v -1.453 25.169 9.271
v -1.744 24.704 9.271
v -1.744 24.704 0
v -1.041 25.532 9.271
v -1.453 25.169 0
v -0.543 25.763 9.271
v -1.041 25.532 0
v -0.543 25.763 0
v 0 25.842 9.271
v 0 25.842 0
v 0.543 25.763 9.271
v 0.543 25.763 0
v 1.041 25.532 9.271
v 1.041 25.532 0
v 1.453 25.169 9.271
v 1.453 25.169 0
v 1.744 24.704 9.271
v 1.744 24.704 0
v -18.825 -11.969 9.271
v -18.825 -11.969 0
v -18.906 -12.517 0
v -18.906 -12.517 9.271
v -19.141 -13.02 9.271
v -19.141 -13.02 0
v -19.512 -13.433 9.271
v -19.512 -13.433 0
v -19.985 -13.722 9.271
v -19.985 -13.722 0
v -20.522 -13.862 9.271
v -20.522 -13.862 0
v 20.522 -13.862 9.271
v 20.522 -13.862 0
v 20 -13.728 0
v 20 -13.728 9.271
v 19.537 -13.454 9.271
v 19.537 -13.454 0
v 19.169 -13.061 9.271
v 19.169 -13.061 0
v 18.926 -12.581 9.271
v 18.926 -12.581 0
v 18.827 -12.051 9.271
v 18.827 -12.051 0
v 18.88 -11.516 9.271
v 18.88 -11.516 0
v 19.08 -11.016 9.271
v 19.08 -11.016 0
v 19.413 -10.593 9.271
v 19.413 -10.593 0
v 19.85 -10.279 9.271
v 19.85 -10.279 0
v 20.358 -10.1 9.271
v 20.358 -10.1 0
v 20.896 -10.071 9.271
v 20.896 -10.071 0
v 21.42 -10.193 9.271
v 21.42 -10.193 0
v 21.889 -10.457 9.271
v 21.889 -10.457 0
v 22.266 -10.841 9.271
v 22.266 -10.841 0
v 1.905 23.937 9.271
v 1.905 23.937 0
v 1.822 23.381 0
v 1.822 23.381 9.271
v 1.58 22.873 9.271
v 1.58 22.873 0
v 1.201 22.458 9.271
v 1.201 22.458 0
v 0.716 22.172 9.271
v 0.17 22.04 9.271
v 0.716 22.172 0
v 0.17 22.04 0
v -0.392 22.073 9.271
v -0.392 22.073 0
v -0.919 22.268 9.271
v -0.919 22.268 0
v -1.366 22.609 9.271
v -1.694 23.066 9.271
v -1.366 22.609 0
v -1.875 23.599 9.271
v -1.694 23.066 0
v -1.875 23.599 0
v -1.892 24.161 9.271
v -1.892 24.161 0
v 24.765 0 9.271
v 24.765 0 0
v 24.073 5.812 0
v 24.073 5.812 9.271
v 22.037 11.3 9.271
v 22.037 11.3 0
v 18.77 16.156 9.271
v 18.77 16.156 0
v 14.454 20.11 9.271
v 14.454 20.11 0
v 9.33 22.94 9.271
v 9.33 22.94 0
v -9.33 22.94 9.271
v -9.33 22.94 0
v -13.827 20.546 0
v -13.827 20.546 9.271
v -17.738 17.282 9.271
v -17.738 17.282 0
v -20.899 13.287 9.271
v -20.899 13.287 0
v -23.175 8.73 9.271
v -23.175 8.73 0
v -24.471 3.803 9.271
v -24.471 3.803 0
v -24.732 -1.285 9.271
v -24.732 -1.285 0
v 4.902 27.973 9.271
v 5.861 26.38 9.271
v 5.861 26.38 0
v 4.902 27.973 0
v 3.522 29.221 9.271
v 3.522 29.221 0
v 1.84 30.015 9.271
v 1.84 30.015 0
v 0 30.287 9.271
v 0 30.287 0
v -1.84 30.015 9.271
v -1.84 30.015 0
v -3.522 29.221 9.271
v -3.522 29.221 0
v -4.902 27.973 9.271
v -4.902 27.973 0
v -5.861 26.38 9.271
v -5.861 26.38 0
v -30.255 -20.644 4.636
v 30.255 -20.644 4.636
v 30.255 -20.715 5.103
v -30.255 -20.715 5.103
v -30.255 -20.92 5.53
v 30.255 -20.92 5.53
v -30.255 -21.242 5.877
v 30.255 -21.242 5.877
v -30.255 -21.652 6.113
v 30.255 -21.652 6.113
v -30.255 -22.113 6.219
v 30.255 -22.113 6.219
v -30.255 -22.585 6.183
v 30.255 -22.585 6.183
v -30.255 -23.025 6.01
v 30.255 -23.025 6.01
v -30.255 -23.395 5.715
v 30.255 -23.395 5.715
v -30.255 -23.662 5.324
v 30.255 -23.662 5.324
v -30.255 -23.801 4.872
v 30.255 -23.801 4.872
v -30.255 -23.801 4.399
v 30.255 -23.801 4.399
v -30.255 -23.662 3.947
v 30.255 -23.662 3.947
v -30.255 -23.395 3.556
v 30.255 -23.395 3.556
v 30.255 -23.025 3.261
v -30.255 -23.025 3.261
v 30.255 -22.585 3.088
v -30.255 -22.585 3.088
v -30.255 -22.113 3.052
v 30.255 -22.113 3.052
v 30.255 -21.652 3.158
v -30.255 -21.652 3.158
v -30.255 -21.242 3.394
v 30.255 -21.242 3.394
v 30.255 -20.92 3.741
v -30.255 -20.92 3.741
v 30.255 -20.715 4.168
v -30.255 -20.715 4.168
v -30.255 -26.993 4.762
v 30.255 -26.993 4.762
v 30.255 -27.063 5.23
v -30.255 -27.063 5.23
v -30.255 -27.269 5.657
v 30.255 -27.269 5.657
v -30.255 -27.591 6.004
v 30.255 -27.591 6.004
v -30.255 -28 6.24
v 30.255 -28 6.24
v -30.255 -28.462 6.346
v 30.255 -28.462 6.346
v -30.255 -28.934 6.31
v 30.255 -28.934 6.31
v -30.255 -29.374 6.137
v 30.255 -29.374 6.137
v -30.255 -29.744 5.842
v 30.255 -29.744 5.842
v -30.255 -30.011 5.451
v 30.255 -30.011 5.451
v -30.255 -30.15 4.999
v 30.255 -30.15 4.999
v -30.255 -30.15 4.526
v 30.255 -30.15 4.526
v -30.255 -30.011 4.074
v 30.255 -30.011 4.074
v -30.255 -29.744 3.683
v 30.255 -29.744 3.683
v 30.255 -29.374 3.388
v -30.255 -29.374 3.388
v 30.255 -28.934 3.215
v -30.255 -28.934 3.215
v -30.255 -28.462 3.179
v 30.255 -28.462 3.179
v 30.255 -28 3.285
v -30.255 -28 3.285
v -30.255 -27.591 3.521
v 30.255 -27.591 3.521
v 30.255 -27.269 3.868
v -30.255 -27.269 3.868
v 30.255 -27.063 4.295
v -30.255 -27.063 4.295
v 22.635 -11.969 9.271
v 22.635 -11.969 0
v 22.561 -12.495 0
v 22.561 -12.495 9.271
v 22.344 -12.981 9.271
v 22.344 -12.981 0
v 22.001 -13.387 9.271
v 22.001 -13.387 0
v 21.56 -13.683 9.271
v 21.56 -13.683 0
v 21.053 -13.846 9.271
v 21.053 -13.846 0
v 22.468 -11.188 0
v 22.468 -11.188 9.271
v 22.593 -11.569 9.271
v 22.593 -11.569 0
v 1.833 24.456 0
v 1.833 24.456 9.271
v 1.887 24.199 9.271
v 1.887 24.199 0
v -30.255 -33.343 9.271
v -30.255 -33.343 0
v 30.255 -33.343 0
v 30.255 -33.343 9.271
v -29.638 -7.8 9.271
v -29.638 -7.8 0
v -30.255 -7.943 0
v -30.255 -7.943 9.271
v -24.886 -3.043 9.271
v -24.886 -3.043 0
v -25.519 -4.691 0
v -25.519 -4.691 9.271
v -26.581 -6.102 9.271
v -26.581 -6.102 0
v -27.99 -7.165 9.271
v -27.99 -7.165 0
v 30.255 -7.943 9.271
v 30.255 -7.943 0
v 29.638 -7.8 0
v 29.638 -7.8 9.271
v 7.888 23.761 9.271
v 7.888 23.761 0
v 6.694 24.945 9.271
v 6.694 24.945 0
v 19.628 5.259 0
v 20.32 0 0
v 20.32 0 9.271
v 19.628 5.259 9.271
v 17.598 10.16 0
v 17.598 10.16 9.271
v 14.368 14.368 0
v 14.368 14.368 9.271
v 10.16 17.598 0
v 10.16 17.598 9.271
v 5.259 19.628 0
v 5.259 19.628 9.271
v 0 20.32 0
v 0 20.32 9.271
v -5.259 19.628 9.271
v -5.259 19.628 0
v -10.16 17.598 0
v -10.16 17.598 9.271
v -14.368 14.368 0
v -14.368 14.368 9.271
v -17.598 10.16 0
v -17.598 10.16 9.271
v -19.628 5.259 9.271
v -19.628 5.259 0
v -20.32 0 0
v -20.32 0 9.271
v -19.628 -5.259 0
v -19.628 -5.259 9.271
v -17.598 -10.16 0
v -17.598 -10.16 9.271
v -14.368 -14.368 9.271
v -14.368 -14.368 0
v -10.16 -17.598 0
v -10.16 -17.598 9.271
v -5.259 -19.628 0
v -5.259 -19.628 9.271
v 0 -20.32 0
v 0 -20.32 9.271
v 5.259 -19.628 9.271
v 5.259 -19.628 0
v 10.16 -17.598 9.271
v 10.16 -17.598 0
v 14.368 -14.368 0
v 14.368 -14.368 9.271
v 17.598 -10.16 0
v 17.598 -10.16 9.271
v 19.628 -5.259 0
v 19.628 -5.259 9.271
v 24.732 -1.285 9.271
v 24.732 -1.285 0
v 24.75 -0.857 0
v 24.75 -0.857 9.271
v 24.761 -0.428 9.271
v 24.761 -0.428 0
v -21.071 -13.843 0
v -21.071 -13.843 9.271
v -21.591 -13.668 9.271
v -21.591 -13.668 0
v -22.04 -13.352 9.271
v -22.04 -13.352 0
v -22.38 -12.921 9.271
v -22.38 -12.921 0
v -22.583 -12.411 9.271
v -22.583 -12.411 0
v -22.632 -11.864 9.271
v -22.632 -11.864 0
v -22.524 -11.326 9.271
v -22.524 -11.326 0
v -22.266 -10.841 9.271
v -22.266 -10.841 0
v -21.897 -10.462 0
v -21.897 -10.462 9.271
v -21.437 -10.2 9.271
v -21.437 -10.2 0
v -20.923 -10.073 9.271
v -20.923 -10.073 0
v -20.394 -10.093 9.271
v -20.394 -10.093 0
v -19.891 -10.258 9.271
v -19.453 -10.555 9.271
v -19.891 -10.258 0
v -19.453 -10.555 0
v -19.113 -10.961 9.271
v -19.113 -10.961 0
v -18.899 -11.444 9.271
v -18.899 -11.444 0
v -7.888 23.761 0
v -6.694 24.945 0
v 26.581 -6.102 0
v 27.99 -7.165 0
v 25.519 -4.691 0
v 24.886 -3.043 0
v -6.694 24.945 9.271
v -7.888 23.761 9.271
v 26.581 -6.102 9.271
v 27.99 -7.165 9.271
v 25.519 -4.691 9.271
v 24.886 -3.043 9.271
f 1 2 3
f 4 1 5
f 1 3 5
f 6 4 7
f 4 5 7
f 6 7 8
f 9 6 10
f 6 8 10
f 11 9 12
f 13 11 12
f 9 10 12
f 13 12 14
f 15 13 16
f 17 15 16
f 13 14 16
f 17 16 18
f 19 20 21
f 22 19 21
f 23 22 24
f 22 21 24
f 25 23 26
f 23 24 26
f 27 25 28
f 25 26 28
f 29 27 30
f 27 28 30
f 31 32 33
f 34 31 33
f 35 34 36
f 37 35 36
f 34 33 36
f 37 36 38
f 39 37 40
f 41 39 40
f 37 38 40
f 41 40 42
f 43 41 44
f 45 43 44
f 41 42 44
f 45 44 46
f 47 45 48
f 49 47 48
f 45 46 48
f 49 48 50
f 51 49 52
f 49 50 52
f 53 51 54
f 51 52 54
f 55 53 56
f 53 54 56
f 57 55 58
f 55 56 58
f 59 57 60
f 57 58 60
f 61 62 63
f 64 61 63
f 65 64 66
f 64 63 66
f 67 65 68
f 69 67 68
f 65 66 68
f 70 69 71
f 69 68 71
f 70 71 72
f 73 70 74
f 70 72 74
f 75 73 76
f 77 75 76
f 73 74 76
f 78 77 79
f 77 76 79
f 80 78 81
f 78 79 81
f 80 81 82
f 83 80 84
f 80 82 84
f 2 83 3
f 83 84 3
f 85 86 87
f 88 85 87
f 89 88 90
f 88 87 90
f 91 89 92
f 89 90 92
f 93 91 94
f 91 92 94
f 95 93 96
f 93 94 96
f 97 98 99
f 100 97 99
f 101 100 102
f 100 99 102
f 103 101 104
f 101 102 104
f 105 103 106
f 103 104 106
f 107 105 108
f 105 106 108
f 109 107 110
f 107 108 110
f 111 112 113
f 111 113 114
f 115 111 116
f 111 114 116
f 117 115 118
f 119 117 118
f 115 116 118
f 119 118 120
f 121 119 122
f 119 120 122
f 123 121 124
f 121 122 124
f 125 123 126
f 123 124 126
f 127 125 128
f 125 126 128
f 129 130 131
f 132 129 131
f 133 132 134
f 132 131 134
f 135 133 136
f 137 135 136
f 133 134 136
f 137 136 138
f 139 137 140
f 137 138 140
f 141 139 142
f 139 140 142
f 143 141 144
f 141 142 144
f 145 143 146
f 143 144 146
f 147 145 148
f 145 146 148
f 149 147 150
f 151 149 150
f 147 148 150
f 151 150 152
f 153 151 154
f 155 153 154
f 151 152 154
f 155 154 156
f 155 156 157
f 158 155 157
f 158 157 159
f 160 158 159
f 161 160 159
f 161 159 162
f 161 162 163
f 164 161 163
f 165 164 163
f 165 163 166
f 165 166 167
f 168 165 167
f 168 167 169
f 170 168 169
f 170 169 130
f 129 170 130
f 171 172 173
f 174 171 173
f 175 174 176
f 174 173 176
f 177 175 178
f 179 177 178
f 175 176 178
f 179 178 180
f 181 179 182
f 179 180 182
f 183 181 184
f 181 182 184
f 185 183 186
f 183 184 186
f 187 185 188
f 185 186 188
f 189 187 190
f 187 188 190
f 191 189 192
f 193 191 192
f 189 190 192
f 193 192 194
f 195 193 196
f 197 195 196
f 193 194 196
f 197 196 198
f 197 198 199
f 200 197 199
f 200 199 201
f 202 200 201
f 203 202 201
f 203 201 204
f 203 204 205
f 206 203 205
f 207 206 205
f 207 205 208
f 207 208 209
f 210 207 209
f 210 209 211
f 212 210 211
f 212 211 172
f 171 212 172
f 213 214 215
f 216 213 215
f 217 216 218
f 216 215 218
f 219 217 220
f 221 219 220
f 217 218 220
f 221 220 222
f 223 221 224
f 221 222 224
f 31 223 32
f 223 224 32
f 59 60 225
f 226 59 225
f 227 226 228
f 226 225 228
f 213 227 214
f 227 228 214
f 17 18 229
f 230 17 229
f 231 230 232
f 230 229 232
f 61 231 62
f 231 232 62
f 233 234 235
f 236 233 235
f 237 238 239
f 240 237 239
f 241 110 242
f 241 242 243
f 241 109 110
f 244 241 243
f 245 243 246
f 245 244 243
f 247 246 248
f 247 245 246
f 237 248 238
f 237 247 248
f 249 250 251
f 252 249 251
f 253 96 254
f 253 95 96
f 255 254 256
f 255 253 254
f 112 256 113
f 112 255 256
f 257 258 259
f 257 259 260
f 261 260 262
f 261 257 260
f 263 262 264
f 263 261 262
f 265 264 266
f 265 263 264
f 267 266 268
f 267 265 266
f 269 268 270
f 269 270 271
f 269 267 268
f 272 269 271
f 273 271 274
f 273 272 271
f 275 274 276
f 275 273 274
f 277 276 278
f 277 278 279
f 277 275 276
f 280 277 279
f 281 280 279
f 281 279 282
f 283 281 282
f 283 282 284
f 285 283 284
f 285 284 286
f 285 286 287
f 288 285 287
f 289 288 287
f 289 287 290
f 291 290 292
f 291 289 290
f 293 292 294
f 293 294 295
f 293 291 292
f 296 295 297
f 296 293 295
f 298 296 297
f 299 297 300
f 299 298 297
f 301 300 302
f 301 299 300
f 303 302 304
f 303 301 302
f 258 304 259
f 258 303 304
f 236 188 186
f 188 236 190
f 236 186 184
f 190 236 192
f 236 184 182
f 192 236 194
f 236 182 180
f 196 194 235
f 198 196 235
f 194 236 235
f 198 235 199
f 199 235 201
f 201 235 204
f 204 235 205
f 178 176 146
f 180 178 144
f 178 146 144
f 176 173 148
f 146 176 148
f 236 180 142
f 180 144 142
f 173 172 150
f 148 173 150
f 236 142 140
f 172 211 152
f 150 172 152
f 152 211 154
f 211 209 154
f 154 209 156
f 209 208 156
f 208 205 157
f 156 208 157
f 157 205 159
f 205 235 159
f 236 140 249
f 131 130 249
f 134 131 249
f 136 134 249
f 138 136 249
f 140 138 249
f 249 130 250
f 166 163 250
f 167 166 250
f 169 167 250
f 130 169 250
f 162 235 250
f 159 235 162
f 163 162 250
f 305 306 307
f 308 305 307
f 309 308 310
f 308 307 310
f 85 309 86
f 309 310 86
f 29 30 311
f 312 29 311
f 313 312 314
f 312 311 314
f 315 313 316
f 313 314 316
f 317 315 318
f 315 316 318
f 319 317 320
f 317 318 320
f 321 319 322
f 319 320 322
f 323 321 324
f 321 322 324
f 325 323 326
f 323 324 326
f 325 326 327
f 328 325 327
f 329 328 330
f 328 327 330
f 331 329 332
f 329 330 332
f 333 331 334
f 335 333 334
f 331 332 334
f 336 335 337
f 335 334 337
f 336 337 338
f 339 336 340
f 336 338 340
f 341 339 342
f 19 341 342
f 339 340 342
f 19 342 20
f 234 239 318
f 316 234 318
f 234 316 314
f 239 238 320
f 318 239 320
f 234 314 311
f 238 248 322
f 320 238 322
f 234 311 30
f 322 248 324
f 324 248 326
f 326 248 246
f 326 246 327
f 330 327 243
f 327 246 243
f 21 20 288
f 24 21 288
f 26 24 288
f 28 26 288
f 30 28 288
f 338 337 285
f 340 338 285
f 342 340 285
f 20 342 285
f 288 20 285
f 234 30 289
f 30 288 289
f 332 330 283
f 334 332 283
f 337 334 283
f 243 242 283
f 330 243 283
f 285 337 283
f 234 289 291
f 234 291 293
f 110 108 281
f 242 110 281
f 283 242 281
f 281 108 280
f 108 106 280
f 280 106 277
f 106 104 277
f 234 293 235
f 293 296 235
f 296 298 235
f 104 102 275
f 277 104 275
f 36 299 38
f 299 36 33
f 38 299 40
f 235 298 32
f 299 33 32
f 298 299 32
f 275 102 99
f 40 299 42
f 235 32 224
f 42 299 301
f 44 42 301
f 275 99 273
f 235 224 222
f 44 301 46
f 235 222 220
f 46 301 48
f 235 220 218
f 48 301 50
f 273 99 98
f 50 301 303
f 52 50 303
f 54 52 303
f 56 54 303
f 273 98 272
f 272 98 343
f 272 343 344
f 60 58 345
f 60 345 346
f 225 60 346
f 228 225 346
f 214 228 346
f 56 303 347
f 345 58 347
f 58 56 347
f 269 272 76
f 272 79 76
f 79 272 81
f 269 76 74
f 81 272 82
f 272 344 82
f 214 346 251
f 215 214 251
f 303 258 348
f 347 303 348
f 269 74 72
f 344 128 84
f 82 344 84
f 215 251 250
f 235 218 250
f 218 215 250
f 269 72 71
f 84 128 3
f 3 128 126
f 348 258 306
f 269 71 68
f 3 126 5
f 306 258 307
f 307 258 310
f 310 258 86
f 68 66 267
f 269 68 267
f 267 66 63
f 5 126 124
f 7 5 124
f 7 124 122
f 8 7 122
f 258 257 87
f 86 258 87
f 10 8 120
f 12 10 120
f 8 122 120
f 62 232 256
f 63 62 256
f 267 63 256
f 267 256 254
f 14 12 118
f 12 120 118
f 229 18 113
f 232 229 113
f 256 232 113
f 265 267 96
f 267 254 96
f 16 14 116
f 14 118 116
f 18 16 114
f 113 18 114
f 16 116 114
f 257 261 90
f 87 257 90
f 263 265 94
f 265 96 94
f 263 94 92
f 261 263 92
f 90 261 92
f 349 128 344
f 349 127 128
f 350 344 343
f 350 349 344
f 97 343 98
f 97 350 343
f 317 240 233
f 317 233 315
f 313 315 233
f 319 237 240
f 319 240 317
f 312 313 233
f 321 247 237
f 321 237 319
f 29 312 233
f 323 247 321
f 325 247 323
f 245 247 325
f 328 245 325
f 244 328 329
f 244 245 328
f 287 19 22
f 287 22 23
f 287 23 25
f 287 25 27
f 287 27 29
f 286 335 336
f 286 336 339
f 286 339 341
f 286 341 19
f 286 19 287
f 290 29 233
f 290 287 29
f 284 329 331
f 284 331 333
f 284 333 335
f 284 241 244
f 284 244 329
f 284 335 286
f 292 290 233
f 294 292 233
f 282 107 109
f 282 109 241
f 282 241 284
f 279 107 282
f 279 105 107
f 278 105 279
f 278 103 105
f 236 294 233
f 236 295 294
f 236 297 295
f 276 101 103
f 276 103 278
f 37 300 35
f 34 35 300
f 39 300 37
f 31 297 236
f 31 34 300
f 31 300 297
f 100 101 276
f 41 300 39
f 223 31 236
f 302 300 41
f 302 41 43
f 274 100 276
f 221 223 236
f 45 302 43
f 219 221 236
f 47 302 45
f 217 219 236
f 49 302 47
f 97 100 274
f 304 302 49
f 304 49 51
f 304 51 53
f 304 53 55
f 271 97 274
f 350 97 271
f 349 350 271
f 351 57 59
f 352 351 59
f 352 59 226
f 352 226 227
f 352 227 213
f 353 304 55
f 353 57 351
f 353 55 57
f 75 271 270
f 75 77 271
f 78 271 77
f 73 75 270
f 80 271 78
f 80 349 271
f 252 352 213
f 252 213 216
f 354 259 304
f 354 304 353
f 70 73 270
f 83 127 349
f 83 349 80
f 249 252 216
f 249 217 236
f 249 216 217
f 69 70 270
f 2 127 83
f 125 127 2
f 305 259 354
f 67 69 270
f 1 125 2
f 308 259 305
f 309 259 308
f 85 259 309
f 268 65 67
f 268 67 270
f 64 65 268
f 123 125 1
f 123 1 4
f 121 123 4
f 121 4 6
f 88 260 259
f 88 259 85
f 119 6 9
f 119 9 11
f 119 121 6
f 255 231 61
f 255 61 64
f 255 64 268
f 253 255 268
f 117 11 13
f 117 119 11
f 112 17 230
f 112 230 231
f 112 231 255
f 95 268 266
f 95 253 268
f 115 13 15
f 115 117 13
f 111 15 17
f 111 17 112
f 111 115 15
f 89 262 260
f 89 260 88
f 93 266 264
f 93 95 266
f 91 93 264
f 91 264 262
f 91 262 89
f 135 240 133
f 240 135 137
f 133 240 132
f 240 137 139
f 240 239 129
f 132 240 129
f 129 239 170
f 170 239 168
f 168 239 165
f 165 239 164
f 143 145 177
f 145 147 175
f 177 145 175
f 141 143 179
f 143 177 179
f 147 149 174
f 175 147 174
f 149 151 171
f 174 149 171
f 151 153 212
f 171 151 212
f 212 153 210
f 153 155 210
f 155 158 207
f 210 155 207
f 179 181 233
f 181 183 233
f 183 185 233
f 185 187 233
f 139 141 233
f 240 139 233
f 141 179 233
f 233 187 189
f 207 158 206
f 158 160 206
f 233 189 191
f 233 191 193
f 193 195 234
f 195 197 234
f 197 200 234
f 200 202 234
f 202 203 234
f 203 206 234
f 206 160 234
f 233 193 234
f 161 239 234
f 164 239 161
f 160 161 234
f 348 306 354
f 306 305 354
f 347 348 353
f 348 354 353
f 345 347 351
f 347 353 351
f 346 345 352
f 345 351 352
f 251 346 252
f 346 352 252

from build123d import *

# Parameters (mm, degrees)
F0_R     = 20.32
F1_DEPTH = 9.271
F2_R     = 1.5875
F3_DEPTH = 60.511199891
F4_R     = 6.35


# Not quite as in the source:
# - a feature names something its author has since deleted; it is built from what else it names


with BuildPart() as f1:
    # F0 (on Top) → F1 (new body)
    with BuildSketch(Plane.XY):
        with BuildLine():
            ThreePointArc((23.9050999455, -6.4692674698), (24.5490837421, -3.2630832697), (24.765, 0))
            ThreePointArc((24.765, 0), (19.6285885254, 15.1004548773), (6.35, 23.9370575677))
            ThreePointArc((6.35, 23.9370575677), (4.0651088886, 24.4290833787), (1.7440091422, 24.703515076))
            ThreePointArc((1.7440091422, 24.703515076), (1.8643178935, 24.3286489263), (1.905, 23.9370575677))
            ThreePointArc((1.905, 23.9370575677), (-0.3915913586, 22.0727396742), (-1.7440091422, 24.703515076))
            ThreePointArc((-1.7440091422, 24.703515076), (-4.0651088886, 24.4290833787), (-6.35, 23.9370575677))
            ThreePointArc((-6.35, 23.9370575677), (-21.4471191247, 12.3825), (-23.9050999455, -6.4692674698))
            ThreePointArc((-23.9050999455, -6.4692674698), (-23.1887612414, -8.6940541227), (-22.2658761897, -10.8414013165))
            ThreePointArc((-22.2658761897, -10.8414013165), (-20.1370690632, -10.1581864481), (-18.8250999455, -11.9685287839))
            ThreePointArc((-18.8250999455, -11.9685287839), (-19.3113489683, -13.239815795), (-20.5218670475, -13.8621137596))
            ThreePointArc((-20.5218670475, -13.8621137596), (-19.1236523528, -15.735029256), (-17.5550999455, -17.4677900979))
            ThreePointArc((-17.5550999455, -17.4677900979), (0, -24.765), (17.5550999455, -17.4677900979))
            ThreePointArc((17.5550999455, -17.4677900979), (19.1236523528, -15.735029256), (20.5218670475, -13.8621137596))
            ThreePointArc((20.5218670475, -13.8621137596), (19.0803215513, -11.0160287839), (22.2658761897, -10.8414013165))
            ThreePointArc((22.2658761897, -10.8414013165), (23.1887612414, -8.6940541227), (23.9050999455, -6.4692674698))
        make_face()
        Circle(F0_R, mode=Mode.SUBTRACT)
        with BuildLine():
            ThreePointArc((-22.2658761897, -10.8414013165), (-23.1887612414, -8.6940541227), (-23.9050999455, -6.4692674698))
            ThreePointArc((-23.9050999455, -6.4692674698), (-26.2293612595, -15.1435287839), (-17.5550999455, -17.4677900979))
            ThreePointArc((-17.5550999455, -17.4677900979), (-19.1236523528, -15.735029256), (-20.5218670475, -13.8621137596))
            ThreePointArc((-20.5218670475, -13.8621137596), (-22.3798783397, -12.9210287839), (-22.2658761897, -10.8414013165))
        make_face()
        with BuildLine():
            ThreePointArc((17.5550999455, -17.4677900979), (26.2293612595, -15.1435287839), (23.9050999455, -6.4692674698))
            ThreePointArc((23.9050999455, -6.4692674698), (23.1887612414, -8.6940541227), (22.2658761897, -10.8414013165))
            ThreePointArc((22.2658761897, -10.8414013165), (22.5404422812, -11.3754979015), (22.6350999455, -11.9685287839))
            ThreePointArc((22.6350999455, -11.9685287839), (22.0013869566, -13.3872797611), (20.5218670475, -13.8621137596))
            ThreePointArc((20.5218670475, -13.8621137596), (19.1236523528, -15.735029256), (17.5550999455, -17.4677900979))
        make_face()
        with BuildLine():
            Line((30.2550999455, -7.9427900979), (23.9050999455, -6.4692674698))
            ThreePointArc((23.9050999455, -6.4692674698), (26.2293612595, -15.1435287839), (17.5550999455, -17.4677900979))
            ThreePointArc((17.5550999455, -17.4677900979), (0, -24.765), (-17.5550999455, -17.4677900979))
            ThreePointArc((-17.5550999455, -17.4677900979), (-26.2293612595, -15.1435287839), (-23.9050999455, -6.4692674698))
            Line((-23.9050999455, -6.4692674698), (-30.2550999455, -7.9427900979))
            Line((-30.2550999455, -7.9427900979), (-30.2550999455, -33.3427900979))
            Line((-30.2550999455, -33.3427900979), (30.2550999455, -33.3427900979))
            Line((30.2550999455, -33.3427900979), (30.2550999455, -7.9427900979))
        make_face()
        with BuildLine():
            ThreePointArc((1.7440091422, 24.703515076), (4.0651088886, 24.4290833787), (6.35, 23.9370575677))
            ThreePointArc((6.35, 23.9370575677), (0, 30.2870575677), (-6.35, 23.9370575677))
            ThreePointArc((-6.35, 23.9370575677), (-4.0651088886, 24.4290833787), (-1.7440091422, 24.703515076))
            ThreePointArc((-1.7440091422, 24.703515076), (0, 25.8420575677), (1.7440091422, 24.703515076))
        make_face()
    extrude(amount=F1_DEPTH)

    # F2 (on face) → F3 (cut, through all)
    with BuildSketch(Plane.YZ.offset(30.2550999455)):
        with Locations((-28.5802900979, 4.7625)):
            Circle(F2_R)
        with Locations((-22.2315602249, 4.6355)):
            Circle(F2_R)
    extrude(amount=-F3_DEPTH, mode=Mode.SUBTRACT)

    # F4
    f4_edges = [f1.edges().sort_by_distance(p)[0] for p in [
        (-23.9051, -6.469267, 4.6355),
        (23.9051, -6.469267, 4.6355),
        (6.35, 23.937058, 4.6355),
        (-6.35, 23.937058, 4.6355),
    ]]
    fillet(f4_edges, radius=F4_R)


solid = f1.part
